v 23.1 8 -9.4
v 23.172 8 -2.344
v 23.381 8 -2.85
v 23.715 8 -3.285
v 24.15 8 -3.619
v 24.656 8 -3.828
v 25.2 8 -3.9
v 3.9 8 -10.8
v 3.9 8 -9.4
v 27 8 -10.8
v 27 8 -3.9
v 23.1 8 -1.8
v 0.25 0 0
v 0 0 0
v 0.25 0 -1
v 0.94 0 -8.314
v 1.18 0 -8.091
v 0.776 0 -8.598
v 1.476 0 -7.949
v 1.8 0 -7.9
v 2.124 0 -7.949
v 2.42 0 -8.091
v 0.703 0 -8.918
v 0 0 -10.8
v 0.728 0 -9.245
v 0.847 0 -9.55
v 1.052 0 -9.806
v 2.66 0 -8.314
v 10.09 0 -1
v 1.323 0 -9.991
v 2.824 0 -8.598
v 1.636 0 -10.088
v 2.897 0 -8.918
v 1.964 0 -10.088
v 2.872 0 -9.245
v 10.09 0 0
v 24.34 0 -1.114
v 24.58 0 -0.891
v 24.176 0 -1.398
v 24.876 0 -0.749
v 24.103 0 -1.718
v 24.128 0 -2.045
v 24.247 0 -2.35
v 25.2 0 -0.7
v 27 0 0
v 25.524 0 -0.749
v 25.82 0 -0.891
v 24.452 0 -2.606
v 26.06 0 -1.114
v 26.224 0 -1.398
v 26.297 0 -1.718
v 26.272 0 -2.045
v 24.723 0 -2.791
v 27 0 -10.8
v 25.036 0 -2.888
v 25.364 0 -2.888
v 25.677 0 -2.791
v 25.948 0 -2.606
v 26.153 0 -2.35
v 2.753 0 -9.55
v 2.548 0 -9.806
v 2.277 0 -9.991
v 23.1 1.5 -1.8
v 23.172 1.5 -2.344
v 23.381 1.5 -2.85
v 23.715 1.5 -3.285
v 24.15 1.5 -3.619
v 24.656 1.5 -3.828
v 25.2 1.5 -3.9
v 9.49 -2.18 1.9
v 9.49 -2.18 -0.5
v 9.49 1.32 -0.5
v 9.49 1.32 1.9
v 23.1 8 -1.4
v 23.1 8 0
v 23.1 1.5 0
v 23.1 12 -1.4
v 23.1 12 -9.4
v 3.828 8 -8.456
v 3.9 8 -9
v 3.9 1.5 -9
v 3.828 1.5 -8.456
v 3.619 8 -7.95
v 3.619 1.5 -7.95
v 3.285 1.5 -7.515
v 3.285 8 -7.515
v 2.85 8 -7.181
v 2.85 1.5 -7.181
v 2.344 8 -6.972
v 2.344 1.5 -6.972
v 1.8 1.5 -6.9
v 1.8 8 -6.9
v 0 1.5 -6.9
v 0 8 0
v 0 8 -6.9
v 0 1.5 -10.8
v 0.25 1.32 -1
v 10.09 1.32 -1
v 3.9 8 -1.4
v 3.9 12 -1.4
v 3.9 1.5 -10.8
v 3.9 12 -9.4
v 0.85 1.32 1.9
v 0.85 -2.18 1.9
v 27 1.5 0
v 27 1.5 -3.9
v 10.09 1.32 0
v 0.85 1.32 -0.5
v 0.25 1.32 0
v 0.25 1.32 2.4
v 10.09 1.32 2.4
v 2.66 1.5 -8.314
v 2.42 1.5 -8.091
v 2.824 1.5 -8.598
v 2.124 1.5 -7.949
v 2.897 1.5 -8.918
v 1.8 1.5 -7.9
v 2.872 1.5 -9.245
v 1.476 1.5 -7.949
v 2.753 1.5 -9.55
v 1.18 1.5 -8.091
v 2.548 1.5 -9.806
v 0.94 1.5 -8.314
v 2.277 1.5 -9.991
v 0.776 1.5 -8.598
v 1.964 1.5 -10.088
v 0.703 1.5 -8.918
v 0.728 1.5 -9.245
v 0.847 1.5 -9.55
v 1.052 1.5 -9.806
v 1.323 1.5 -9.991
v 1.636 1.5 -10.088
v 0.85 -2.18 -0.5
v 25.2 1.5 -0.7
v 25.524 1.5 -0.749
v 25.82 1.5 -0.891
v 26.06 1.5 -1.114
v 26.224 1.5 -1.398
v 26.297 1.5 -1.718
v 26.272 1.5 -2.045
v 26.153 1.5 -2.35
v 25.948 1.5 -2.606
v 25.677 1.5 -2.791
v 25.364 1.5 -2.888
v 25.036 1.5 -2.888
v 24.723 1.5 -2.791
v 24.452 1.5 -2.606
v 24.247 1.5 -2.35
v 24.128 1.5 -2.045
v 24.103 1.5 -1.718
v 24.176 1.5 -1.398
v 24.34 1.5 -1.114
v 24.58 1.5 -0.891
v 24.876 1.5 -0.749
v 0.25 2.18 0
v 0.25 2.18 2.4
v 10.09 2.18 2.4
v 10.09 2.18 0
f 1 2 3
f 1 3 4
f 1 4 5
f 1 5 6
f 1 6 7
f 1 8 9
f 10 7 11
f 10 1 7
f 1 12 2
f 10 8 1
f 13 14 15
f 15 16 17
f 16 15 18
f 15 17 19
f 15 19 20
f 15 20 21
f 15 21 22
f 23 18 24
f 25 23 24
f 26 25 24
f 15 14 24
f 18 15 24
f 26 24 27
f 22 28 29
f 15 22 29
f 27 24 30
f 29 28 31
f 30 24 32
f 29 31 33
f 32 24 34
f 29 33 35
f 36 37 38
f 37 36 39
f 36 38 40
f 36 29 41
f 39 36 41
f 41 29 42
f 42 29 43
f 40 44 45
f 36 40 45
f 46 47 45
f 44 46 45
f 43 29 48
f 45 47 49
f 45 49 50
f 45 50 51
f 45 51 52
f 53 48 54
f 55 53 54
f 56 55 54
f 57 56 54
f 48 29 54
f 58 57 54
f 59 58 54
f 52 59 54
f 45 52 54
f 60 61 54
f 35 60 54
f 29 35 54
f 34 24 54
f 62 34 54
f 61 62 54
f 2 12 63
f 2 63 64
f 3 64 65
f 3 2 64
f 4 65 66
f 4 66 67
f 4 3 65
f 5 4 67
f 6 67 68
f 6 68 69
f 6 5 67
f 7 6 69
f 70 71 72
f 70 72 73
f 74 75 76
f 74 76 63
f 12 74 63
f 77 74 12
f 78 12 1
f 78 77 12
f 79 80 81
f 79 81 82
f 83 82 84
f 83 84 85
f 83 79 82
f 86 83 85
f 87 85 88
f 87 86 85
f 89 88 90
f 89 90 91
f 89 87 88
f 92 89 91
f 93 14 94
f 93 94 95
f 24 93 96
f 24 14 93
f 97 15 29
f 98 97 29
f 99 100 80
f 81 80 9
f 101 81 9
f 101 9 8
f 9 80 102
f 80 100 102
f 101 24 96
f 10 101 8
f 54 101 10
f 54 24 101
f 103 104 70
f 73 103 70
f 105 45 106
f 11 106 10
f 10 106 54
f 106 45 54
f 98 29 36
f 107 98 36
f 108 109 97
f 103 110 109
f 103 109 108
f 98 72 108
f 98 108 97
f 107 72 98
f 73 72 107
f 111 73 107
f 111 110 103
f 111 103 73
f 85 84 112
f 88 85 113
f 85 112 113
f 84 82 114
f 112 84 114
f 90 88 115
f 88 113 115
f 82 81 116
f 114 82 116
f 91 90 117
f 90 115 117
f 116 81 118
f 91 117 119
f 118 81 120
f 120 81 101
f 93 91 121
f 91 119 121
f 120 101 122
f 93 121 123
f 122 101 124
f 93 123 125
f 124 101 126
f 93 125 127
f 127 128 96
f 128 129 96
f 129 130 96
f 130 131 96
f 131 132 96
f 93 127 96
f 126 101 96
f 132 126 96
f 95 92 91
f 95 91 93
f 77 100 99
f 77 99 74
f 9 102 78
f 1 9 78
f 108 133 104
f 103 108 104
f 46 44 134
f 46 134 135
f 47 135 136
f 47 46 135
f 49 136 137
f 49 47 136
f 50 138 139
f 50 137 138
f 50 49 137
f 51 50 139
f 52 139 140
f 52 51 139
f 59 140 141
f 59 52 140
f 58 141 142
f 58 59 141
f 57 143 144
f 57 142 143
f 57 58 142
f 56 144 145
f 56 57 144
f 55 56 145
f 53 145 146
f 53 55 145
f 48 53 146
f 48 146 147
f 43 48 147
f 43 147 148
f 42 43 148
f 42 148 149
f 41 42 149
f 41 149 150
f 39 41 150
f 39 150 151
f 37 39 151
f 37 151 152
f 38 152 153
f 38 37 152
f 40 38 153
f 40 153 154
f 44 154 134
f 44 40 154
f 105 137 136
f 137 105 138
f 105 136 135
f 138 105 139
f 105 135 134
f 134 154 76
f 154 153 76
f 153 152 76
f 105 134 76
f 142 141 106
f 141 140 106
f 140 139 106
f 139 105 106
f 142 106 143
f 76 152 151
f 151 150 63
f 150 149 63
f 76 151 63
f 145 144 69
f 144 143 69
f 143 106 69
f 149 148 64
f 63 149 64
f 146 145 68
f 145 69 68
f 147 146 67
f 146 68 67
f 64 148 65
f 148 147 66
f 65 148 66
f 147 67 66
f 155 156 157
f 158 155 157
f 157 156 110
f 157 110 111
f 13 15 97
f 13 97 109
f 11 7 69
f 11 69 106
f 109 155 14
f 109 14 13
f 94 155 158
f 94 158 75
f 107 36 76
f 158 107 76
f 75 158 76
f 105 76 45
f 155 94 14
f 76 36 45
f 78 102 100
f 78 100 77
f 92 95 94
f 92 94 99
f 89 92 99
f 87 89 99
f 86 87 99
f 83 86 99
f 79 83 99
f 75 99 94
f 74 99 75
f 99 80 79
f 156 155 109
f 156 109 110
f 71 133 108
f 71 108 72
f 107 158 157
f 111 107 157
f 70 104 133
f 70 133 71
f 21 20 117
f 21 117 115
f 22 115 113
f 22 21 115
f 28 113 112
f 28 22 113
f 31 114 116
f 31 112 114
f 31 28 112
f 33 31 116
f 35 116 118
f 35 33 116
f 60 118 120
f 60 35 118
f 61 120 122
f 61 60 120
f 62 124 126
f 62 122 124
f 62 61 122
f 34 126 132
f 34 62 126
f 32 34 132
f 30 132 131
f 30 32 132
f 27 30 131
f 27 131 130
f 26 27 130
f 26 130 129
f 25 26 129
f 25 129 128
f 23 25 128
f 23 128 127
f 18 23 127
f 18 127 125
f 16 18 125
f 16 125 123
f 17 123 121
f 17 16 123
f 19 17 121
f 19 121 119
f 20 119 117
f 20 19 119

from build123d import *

# Parameters (mm, degrees)
SKETCH1_W                = 27
SKETCH1_H                = 10.8
BOSS_EXTRUDE1_DEPTH      = 12
SKETCH2_W                = 3.9
SKETCH2_H                = 10.8
CUT_EXTRUDE1_DEPTH       = 4
SKETCH3_W                = 3.9
SKETCH3_H                = 10.8
CUT_EXTRUDE2_DEPTH       = 4
CUT_EXTRUDE3_DEPTH       = 31.160238726
CUT_EXTRUDE3_DEPTH_BACK  = 31.160238726
SKETCH4_R                = 1.1
CUT_EXTRUDE4_DEPTH       = 31.160238726
CUT_EXTRUDE4_DEPTH_BACK  = 31.160238726
SKETCH5_R                = 1.1
CUT_EXTRUDE5_DEPTH       = 6.5
SKETCH7_OUTSIDE_W        = 35.292
SKETCH7_OUTSIDE_H        = 19.092
SKETCH7_OUTSIDE_W_2      = 19.2
SKETCH7_OUTSIDE_H_2      = 8
CUT_EXTRUDE6_DEPTH       = 4
BOSS_EXTRUDE2_DEPTH      = 2.18
BOSS_EXTRUDE2_DEPTH_BACK = 2.18
SKETCH8_W                = 9.84
SKETCH8_H                = 3.4
SKETCH9_W                = 9.84
SKETCH9_H                = 3.4
SKETCH9_W_2              = 8.64
SKETCH9_H_2              = 2.4
CUT_EXTRUDE7_DEPTH       = 3.5


with BuildPart() as part:
    # Sketch1 → Boss-Extrude1 (new body)
    with BuildSketch(Plane(origin=(0, 0, 0), x_dir=(1, 0, 0), z_dir=(0, 1, 0))):
        with Locations((13.5, 5.4)):
            Rectangle(SKETCH1_W, SKETCH1_H)
    extrude(amount=BOSS_EXTRUDE1_DEPTH)

    # Sketch2 → Cut-Extrude1 (cut)
    with BuildSketch(Plane(origin=(0, 12, 0), x_dir=(1, 0, 0), z_dir=(0, 1, 0))):
        with Locations((1.95, 5.4)):
            Rectangle(SKETCH2_W, SKETCH2_H)
    extrude(amount=-CUT_EXTRUDE1_DEPTH, mode=Mode.SUBTRACT)

    # Sketch3 → Cut-Extrude2 (cut)
    with BuildSketch(Plane(origin=(0, 12, 0), x_dir=(1, 0, 0), z_dir=(0, 1, 0))):
        with Locations((25.05, 5.4)):
            Rectangle(SKETCH3_W, SKETCH3_H)
    extrude(amount=-CUT_EXTRUDE2_DEPTH, mode=Mode.SUBTRACT)

    # Sketch4 → Cut-Extrude3 (cut, two sides: drawn at the far end of the back side and taken through both)
    with BuildSketch(Plane(origin=(0, 8, 0), x_dir=(1, 0, 0), z_dir=(0, 1, 0)).offset(-CUT_EXTRUDE3_DEPTH_BACK)):
        with Locations(Location((25.2, 1.8, 0), (0, 0, 270))):
            Circle(SKETCH4_R)
    extrude(amount=CUT_EXTRUDE3_DEPTH + CUT_EXTRUDE3_DEPTH_BACK, mode=Mode.SUBTRACT)

    # Sketch5 → Cut-Extrude4 (cut, two sides: drawn at the far end of the back side and taken through both)
    with BuildSketch(Plane(origin=(0, 8, 0), x_dir=(1, 0, 0), z_dir=(0, 1, 0)).offset(-CUT_EXTRUDE4_DEPTH_BACK)):
        with Locations(Location((1.8, 9, 0), (0, 0, 270))):
            Circle(SKETCH5_R)
    extrude(amount=CUT_EXTRUDE4_DEPTH + CUT_EXTRUDE4_DEPTH_BACK, mode=Mode.SUBTRACT)

    # Sketch6 → Cut-Extrude5 (cut)
    with BuildSketch(Plane(origin=(0, 8, 0), x_dir=(1, 0, 0), z_dir=(0, 1, 0))):
        with BuildLine():
            Line((1.8, 6.9), (0, 6.9))
            Line((0, 6.9), (0, 10.8))
            Line((0, 10.8), (3.9, 10.8))
            Line((3.9, 10.8), (3.9, 9))
            ThreePointArc((3.9, 9), (3.28492424, 7.51507576), (1.8, 6.9))
        make_face()
        with BuildLine():
            Line((25.2, 3.9), (27, 3.9))
            Line((27, 3.9), (27, 0))
            Line((27, 0), (23.1, 0))
            Line((23.1, 0), (23.1, 1.8))
            ThreePointArc((23.1, 1.8), (23.71507576, 3.28492424), (25.2, 3.9))
        make_face()
    extrude(amount=-CUT_EXTRUDE5_DEPTH, mode=Mode.SUBTRACT)

    # Sketch7 outside → Cut-Extrude6 (cut)
    with BuildSketch(Plane(origin=(0, 12, 0), x_dir=(1, 0, 0), z_dir=(0, 1, 0))):
        with Locations((13.5, 5.4)):
            Rectangle(SKETCH7_OUTSIDE_W, SKETCH7_OUTSIDE_H)
        with Locations((13.5, 5.4)):
            Rectangle(SKETCH7_OUTSIDE_W_2, SKETCH7_OUTSIDE_H_2, mode=Mode.SUBTRACT)
    extrude(amount=-CUT_EXTRUDE6_DEPTH, mode=Mode.SUBTRACT)

    # Sketch8 → Boss-Extrude2 (add, two sides: drawn at the far end of the back side and taken through both)
    with BuildSketch(Plane.XZ.offset(-BOSS_EXTRUDE2_DEPTH_BACK)):
        with Locations((5.17, 0.7)):
            Rectangle(SKETCH8_W, SKETCH8_H)
    extrude(amount=BOSS_EXTRUDE2_DEPTH + BOSS_EXTRUDE2_DEPTH_BACK)

    # Sketch9 → Cut-Extrude7 (cut)
    with BuildSketch(Plane.XZ.offset(2.18)):
        with Locations((5.17, 0.7)):
            Rectangle(SKETCH9_W, SKETCH9_H)
        with Locations((5.17, 0.7)):
            Rectangle(SKETCH9_W_2, SKETCH9_H_2, mode=Mode.SUBTRACT)
    extrude(amount=-CUT_EXTRUDE7_DEPTH, mode=Mode.SUBTRACT)


solid = part.part
